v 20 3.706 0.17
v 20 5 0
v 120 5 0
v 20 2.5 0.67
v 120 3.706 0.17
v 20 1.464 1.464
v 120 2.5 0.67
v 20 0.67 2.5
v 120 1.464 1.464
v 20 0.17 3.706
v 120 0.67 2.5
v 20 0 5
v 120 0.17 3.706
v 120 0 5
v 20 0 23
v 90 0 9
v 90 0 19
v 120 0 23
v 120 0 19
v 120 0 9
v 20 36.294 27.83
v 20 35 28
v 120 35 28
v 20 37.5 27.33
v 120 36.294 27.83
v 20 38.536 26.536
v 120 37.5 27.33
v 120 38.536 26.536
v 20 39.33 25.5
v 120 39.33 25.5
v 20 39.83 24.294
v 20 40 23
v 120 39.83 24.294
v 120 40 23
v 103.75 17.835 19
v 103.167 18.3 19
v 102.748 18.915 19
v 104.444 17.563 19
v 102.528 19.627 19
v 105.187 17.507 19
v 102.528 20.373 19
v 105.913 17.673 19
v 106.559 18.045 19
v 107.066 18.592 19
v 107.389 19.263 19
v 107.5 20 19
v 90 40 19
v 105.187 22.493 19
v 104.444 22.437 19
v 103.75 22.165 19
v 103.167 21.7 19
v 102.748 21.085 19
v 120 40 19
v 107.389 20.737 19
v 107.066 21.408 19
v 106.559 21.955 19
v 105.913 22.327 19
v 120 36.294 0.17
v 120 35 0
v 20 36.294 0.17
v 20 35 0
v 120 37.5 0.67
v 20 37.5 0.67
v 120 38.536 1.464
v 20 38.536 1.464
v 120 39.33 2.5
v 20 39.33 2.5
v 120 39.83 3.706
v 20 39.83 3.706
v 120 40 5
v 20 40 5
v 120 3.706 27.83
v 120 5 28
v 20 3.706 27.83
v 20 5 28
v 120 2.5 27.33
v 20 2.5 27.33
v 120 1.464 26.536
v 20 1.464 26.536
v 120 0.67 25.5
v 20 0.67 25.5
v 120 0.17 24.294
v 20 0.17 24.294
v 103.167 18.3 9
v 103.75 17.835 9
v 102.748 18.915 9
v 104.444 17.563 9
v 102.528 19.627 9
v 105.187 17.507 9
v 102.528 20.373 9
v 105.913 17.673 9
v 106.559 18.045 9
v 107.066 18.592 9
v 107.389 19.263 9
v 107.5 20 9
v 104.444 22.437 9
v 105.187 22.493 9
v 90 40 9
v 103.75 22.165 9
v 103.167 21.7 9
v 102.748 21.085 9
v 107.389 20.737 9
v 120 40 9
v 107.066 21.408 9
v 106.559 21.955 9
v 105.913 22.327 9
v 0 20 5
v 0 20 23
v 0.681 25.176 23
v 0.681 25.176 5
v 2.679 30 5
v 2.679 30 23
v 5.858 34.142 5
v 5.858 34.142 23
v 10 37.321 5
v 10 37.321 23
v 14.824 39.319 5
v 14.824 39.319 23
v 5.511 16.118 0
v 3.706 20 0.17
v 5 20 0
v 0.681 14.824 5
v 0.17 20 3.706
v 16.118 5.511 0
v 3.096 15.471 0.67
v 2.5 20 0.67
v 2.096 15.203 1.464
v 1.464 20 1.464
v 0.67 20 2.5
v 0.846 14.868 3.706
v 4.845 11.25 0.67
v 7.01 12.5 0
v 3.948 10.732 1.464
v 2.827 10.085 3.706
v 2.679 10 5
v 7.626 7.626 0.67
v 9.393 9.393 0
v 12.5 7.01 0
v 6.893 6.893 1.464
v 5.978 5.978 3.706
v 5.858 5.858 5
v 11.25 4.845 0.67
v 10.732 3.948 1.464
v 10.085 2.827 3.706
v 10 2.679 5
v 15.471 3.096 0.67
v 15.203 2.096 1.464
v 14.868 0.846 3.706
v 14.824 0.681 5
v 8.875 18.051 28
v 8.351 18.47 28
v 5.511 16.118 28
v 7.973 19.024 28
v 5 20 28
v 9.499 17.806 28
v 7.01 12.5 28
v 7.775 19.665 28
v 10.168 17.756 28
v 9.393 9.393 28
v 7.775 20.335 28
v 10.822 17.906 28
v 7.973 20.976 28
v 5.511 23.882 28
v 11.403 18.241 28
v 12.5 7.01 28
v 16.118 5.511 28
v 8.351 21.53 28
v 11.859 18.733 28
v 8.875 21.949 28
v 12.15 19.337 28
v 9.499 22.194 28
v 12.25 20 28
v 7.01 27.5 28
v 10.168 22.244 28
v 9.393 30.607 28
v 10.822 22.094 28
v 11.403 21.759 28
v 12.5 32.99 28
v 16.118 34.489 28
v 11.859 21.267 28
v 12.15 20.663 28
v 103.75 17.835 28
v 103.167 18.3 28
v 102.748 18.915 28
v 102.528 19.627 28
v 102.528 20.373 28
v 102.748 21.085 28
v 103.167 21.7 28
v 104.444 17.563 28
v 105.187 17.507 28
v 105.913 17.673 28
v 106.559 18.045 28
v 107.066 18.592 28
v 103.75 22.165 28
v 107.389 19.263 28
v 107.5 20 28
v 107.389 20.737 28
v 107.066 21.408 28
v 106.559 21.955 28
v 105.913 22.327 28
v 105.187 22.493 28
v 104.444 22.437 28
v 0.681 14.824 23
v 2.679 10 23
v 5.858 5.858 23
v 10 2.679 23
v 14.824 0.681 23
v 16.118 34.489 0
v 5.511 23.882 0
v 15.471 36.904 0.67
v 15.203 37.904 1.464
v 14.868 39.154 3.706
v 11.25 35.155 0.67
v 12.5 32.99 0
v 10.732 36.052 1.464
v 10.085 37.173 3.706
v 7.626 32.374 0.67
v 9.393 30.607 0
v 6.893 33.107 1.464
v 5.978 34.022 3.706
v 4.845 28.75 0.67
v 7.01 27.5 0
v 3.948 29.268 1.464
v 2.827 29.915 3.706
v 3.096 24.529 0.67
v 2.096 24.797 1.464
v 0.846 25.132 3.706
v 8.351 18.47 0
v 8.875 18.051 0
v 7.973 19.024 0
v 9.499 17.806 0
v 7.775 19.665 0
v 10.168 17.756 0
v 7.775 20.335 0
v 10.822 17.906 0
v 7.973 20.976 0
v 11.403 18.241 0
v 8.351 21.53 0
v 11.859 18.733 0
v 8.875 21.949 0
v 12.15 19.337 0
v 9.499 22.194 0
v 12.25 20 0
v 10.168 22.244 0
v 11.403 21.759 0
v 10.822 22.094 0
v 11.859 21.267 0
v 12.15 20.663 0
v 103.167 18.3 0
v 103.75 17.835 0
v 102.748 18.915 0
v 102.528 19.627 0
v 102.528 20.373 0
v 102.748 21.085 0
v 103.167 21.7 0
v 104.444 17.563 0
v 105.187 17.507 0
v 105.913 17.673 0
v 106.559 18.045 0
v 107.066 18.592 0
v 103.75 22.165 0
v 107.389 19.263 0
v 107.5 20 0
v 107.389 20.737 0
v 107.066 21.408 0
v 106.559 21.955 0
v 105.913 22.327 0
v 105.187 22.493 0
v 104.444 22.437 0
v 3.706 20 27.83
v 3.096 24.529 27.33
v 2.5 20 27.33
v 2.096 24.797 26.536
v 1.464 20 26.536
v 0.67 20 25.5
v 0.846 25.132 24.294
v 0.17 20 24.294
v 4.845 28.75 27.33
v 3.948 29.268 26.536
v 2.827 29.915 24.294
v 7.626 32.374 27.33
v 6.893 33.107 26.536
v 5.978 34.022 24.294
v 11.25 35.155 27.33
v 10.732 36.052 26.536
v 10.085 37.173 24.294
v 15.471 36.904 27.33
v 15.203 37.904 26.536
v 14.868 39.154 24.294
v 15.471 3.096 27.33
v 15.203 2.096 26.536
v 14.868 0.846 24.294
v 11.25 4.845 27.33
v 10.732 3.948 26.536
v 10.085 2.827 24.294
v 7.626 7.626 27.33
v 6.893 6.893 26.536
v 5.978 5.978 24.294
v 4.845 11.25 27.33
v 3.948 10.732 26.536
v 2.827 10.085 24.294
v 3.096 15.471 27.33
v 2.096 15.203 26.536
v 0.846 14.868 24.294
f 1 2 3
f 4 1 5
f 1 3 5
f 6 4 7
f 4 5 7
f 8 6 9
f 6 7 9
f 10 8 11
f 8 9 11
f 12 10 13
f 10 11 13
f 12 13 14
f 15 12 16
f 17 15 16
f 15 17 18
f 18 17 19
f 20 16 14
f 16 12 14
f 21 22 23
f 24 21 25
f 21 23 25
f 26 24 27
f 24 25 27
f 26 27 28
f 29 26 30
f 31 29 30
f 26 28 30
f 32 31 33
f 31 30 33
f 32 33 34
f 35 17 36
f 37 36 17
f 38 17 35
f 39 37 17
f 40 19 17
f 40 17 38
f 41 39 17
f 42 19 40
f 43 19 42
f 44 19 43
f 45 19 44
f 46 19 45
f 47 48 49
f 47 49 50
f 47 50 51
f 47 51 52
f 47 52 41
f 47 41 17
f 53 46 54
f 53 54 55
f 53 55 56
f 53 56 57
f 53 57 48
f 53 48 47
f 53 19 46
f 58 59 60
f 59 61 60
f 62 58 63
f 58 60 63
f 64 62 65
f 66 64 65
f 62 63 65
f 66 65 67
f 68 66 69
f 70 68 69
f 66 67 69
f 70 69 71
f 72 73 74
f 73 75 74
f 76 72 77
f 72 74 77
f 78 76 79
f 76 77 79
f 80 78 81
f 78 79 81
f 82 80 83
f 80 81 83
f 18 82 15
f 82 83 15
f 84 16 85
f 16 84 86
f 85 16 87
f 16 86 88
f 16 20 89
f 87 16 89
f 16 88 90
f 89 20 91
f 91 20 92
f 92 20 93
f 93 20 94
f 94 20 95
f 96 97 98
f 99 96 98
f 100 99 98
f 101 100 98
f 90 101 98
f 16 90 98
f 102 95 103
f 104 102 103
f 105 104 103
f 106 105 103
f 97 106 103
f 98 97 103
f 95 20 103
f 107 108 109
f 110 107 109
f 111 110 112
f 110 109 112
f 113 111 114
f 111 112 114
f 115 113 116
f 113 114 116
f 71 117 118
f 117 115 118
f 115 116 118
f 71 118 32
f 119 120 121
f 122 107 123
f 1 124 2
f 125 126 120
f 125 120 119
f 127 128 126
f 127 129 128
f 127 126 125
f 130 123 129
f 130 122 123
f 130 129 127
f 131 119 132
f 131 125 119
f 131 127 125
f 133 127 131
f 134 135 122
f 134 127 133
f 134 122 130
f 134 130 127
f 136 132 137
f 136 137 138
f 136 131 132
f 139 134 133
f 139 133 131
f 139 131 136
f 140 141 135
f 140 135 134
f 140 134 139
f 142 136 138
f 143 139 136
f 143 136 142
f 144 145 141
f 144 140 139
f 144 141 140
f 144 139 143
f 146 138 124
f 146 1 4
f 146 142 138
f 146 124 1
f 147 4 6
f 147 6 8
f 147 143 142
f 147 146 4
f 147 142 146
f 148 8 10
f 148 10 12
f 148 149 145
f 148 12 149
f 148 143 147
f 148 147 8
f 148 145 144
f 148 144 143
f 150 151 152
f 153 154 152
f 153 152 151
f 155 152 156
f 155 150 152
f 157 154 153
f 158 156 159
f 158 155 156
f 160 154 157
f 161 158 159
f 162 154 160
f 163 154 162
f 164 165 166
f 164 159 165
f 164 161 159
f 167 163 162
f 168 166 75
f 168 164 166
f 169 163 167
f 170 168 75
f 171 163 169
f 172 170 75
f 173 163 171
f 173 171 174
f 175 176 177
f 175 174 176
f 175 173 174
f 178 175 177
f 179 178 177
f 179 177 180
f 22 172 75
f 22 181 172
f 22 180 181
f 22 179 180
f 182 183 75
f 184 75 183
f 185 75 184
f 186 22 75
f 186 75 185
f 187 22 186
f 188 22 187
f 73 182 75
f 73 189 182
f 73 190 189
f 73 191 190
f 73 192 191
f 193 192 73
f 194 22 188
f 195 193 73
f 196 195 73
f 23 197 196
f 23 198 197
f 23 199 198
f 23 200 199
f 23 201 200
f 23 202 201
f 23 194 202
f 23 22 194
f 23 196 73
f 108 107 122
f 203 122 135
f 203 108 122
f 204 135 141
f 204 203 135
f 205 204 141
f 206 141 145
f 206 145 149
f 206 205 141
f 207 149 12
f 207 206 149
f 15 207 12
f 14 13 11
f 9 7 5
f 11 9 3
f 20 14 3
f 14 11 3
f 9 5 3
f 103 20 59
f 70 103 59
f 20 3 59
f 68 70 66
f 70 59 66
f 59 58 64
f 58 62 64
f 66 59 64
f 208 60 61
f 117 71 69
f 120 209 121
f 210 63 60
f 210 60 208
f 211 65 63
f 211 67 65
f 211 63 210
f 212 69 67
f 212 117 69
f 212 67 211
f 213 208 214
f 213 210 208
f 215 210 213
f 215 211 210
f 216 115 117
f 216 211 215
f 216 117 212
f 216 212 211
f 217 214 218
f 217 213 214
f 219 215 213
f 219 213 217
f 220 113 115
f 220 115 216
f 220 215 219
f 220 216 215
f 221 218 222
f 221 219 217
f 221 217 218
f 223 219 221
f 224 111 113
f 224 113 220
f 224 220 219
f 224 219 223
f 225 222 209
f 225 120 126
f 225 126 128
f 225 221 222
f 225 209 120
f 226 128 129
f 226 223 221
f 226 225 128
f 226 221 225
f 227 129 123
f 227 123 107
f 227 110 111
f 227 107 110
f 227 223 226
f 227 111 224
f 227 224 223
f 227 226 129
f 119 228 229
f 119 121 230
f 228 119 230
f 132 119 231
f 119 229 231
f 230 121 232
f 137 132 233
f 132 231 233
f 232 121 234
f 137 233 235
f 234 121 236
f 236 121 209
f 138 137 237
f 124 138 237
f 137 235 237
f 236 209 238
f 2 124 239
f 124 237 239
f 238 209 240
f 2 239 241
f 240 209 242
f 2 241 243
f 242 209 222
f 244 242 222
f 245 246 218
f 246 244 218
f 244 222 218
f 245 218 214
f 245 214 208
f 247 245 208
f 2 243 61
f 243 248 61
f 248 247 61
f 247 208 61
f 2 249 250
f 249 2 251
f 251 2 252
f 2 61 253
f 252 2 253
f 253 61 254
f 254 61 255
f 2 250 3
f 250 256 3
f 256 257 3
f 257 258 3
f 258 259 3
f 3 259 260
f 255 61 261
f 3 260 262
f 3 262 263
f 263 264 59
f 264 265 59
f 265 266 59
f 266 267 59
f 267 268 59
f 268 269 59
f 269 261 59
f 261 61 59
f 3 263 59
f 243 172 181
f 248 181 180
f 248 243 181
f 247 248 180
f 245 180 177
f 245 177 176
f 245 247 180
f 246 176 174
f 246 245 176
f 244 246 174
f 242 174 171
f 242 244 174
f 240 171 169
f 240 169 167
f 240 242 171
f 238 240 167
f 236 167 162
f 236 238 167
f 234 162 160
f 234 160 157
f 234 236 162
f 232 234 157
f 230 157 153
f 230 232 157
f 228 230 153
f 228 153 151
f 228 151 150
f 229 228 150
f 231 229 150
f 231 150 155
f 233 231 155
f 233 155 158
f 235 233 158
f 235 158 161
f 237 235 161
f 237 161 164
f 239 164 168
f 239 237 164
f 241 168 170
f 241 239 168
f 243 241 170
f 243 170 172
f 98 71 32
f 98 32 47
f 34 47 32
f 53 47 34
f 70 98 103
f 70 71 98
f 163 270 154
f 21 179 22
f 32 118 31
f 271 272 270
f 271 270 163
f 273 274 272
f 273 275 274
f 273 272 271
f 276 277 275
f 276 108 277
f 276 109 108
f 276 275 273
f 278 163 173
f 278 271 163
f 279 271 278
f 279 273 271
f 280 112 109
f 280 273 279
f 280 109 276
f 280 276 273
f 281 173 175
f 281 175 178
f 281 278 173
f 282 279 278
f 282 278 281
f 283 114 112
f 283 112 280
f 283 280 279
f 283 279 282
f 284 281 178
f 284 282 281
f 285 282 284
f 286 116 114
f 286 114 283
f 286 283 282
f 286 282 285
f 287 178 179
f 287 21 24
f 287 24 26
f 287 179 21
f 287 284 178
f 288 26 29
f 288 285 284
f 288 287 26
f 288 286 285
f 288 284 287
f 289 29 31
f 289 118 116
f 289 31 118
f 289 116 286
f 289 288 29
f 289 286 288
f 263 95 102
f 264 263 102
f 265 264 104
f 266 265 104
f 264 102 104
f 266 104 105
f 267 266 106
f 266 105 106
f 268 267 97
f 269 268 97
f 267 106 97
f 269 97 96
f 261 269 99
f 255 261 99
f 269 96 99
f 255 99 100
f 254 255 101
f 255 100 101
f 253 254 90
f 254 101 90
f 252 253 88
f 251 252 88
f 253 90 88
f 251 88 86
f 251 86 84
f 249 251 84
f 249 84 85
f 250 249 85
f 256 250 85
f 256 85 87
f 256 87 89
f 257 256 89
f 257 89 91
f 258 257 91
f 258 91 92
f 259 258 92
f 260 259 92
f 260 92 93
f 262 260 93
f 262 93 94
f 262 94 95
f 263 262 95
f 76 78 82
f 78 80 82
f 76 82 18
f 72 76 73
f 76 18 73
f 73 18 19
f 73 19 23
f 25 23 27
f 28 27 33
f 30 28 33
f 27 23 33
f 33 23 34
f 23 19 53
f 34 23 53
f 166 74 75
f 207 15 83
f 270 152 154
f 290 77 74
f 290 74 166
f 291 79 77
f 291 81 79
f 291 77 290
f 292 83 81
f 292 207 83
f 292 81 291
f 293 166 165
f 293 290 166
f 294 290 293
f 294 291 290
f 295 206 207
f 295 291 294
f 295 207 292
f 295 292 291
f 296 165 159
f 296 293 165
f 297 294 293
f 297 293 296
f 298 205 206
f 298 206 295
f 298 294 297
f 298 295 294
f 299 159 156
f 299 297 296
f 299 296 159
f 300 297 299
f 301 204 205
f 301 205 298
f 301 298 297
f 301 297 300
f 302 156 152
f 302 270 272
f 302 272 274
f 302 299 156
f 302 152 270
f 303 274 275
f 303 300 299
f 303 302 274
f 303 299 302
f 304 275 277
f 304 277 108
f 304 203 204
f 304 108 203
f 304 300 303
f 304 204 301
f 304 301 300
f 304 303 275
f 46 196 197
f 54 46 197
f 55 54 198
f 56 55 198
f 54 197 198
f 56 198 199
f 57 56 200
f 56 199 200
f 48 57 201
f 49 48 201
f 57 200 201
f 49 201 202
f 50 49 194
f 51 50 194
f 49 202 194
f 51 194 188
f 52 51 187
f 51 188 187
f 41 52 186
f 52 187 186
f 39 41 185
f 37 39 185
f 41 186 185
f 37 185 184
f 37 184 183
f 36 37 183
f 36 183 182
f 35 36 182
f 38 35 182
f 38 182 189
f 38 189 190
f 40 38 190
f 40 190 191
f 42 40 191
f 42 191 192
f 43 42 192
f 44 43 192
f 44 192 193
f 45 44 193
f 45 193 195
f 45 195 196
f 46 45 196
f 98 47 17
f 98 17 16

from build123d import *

# Parameters (mm, degrees)
ESBO_O1_W                = 120
ESBO_O1_H                = 40
ESBO_O1_R                = 2.25
RESSALTO_EXTRUS_O1_DEPTH = 28
ESBO_O2_W                = 10
ESBO_O2_H                = 40
CORTE_EXTRUS_O1_DEPTH    = 30
FILETE1_R                = 20
FILETE2_R                = 5
ESBO_O3_R                = 2.5
CORTE_EXTRUS_O2_DEPTH    = 40


with BuildPart() as part:
    # Esboço1 → Ressalto-extrusão1 (new body)
    with BuildSketch(Plane.XY):
        with Locations((60, 20)):
            Rectangle(ESBO_O1_W, ESBO_O1_H)
        with Locations((10, 20)):
            Circle(ESBO_O1_R, mode=Mode.SUBTRACT)
    extrude(amount=RESSALTO_EXTRUS_O1_DEPTH)

    # Esboço2 → Corte-extrusão1 (cut)
    with BuildSketch(Plane(origin=(120, 0, 0), x_dir=(0, 0, -1), z_dir=(1, 0, 0))):
        with Locations((-14, 20)):
            Rectangle(ESBO_O2_W, ESBO_O2_H)
    extrude(amount=-CORTE_EXTRUS_O1_DEPTH, mode=Mode.SUBTRACT)

    # Filete1
    filete1_edges = [part.edges().sort_by_distance(p)[0] for p in [
        (0, 0, 14),
        (0, 40, 14),
    ]]
    fillet(filete1_edges, radius=FILETE1_R - 0.0001)  # a hair under: the kernel refuses the full size

    # Filete2
    filete2_edges = [part.edges().sort_by_distance(p)[0] for p in [
        (69.99995, 40, 28),
        (69.99995, 0, 28),
        (69.99995, 0, 0),
        (5.857835087, 34.142164913, 0),
        (5.857835087, 5.857835087, 0),
        (5.857835087, 34.142164913, 28),
        (5.857835087, 5.857835087, 28),
        (69.99995, 40, 0),
    ]]
    fillet(filete2_edges, radius=FILETE2_R)

    # Esboço3 → Corte-extrusão2 (cut)
    with BuildSketch(Plane.XY.offset(28)):
        with Locations((105, 20)):
            Circle(ESBO_O3_R)
    extrude(amount=-CORTE_EXTRUS_O2_DEPTH, mode=Mode.SUBTRACT)


solid = part.part
